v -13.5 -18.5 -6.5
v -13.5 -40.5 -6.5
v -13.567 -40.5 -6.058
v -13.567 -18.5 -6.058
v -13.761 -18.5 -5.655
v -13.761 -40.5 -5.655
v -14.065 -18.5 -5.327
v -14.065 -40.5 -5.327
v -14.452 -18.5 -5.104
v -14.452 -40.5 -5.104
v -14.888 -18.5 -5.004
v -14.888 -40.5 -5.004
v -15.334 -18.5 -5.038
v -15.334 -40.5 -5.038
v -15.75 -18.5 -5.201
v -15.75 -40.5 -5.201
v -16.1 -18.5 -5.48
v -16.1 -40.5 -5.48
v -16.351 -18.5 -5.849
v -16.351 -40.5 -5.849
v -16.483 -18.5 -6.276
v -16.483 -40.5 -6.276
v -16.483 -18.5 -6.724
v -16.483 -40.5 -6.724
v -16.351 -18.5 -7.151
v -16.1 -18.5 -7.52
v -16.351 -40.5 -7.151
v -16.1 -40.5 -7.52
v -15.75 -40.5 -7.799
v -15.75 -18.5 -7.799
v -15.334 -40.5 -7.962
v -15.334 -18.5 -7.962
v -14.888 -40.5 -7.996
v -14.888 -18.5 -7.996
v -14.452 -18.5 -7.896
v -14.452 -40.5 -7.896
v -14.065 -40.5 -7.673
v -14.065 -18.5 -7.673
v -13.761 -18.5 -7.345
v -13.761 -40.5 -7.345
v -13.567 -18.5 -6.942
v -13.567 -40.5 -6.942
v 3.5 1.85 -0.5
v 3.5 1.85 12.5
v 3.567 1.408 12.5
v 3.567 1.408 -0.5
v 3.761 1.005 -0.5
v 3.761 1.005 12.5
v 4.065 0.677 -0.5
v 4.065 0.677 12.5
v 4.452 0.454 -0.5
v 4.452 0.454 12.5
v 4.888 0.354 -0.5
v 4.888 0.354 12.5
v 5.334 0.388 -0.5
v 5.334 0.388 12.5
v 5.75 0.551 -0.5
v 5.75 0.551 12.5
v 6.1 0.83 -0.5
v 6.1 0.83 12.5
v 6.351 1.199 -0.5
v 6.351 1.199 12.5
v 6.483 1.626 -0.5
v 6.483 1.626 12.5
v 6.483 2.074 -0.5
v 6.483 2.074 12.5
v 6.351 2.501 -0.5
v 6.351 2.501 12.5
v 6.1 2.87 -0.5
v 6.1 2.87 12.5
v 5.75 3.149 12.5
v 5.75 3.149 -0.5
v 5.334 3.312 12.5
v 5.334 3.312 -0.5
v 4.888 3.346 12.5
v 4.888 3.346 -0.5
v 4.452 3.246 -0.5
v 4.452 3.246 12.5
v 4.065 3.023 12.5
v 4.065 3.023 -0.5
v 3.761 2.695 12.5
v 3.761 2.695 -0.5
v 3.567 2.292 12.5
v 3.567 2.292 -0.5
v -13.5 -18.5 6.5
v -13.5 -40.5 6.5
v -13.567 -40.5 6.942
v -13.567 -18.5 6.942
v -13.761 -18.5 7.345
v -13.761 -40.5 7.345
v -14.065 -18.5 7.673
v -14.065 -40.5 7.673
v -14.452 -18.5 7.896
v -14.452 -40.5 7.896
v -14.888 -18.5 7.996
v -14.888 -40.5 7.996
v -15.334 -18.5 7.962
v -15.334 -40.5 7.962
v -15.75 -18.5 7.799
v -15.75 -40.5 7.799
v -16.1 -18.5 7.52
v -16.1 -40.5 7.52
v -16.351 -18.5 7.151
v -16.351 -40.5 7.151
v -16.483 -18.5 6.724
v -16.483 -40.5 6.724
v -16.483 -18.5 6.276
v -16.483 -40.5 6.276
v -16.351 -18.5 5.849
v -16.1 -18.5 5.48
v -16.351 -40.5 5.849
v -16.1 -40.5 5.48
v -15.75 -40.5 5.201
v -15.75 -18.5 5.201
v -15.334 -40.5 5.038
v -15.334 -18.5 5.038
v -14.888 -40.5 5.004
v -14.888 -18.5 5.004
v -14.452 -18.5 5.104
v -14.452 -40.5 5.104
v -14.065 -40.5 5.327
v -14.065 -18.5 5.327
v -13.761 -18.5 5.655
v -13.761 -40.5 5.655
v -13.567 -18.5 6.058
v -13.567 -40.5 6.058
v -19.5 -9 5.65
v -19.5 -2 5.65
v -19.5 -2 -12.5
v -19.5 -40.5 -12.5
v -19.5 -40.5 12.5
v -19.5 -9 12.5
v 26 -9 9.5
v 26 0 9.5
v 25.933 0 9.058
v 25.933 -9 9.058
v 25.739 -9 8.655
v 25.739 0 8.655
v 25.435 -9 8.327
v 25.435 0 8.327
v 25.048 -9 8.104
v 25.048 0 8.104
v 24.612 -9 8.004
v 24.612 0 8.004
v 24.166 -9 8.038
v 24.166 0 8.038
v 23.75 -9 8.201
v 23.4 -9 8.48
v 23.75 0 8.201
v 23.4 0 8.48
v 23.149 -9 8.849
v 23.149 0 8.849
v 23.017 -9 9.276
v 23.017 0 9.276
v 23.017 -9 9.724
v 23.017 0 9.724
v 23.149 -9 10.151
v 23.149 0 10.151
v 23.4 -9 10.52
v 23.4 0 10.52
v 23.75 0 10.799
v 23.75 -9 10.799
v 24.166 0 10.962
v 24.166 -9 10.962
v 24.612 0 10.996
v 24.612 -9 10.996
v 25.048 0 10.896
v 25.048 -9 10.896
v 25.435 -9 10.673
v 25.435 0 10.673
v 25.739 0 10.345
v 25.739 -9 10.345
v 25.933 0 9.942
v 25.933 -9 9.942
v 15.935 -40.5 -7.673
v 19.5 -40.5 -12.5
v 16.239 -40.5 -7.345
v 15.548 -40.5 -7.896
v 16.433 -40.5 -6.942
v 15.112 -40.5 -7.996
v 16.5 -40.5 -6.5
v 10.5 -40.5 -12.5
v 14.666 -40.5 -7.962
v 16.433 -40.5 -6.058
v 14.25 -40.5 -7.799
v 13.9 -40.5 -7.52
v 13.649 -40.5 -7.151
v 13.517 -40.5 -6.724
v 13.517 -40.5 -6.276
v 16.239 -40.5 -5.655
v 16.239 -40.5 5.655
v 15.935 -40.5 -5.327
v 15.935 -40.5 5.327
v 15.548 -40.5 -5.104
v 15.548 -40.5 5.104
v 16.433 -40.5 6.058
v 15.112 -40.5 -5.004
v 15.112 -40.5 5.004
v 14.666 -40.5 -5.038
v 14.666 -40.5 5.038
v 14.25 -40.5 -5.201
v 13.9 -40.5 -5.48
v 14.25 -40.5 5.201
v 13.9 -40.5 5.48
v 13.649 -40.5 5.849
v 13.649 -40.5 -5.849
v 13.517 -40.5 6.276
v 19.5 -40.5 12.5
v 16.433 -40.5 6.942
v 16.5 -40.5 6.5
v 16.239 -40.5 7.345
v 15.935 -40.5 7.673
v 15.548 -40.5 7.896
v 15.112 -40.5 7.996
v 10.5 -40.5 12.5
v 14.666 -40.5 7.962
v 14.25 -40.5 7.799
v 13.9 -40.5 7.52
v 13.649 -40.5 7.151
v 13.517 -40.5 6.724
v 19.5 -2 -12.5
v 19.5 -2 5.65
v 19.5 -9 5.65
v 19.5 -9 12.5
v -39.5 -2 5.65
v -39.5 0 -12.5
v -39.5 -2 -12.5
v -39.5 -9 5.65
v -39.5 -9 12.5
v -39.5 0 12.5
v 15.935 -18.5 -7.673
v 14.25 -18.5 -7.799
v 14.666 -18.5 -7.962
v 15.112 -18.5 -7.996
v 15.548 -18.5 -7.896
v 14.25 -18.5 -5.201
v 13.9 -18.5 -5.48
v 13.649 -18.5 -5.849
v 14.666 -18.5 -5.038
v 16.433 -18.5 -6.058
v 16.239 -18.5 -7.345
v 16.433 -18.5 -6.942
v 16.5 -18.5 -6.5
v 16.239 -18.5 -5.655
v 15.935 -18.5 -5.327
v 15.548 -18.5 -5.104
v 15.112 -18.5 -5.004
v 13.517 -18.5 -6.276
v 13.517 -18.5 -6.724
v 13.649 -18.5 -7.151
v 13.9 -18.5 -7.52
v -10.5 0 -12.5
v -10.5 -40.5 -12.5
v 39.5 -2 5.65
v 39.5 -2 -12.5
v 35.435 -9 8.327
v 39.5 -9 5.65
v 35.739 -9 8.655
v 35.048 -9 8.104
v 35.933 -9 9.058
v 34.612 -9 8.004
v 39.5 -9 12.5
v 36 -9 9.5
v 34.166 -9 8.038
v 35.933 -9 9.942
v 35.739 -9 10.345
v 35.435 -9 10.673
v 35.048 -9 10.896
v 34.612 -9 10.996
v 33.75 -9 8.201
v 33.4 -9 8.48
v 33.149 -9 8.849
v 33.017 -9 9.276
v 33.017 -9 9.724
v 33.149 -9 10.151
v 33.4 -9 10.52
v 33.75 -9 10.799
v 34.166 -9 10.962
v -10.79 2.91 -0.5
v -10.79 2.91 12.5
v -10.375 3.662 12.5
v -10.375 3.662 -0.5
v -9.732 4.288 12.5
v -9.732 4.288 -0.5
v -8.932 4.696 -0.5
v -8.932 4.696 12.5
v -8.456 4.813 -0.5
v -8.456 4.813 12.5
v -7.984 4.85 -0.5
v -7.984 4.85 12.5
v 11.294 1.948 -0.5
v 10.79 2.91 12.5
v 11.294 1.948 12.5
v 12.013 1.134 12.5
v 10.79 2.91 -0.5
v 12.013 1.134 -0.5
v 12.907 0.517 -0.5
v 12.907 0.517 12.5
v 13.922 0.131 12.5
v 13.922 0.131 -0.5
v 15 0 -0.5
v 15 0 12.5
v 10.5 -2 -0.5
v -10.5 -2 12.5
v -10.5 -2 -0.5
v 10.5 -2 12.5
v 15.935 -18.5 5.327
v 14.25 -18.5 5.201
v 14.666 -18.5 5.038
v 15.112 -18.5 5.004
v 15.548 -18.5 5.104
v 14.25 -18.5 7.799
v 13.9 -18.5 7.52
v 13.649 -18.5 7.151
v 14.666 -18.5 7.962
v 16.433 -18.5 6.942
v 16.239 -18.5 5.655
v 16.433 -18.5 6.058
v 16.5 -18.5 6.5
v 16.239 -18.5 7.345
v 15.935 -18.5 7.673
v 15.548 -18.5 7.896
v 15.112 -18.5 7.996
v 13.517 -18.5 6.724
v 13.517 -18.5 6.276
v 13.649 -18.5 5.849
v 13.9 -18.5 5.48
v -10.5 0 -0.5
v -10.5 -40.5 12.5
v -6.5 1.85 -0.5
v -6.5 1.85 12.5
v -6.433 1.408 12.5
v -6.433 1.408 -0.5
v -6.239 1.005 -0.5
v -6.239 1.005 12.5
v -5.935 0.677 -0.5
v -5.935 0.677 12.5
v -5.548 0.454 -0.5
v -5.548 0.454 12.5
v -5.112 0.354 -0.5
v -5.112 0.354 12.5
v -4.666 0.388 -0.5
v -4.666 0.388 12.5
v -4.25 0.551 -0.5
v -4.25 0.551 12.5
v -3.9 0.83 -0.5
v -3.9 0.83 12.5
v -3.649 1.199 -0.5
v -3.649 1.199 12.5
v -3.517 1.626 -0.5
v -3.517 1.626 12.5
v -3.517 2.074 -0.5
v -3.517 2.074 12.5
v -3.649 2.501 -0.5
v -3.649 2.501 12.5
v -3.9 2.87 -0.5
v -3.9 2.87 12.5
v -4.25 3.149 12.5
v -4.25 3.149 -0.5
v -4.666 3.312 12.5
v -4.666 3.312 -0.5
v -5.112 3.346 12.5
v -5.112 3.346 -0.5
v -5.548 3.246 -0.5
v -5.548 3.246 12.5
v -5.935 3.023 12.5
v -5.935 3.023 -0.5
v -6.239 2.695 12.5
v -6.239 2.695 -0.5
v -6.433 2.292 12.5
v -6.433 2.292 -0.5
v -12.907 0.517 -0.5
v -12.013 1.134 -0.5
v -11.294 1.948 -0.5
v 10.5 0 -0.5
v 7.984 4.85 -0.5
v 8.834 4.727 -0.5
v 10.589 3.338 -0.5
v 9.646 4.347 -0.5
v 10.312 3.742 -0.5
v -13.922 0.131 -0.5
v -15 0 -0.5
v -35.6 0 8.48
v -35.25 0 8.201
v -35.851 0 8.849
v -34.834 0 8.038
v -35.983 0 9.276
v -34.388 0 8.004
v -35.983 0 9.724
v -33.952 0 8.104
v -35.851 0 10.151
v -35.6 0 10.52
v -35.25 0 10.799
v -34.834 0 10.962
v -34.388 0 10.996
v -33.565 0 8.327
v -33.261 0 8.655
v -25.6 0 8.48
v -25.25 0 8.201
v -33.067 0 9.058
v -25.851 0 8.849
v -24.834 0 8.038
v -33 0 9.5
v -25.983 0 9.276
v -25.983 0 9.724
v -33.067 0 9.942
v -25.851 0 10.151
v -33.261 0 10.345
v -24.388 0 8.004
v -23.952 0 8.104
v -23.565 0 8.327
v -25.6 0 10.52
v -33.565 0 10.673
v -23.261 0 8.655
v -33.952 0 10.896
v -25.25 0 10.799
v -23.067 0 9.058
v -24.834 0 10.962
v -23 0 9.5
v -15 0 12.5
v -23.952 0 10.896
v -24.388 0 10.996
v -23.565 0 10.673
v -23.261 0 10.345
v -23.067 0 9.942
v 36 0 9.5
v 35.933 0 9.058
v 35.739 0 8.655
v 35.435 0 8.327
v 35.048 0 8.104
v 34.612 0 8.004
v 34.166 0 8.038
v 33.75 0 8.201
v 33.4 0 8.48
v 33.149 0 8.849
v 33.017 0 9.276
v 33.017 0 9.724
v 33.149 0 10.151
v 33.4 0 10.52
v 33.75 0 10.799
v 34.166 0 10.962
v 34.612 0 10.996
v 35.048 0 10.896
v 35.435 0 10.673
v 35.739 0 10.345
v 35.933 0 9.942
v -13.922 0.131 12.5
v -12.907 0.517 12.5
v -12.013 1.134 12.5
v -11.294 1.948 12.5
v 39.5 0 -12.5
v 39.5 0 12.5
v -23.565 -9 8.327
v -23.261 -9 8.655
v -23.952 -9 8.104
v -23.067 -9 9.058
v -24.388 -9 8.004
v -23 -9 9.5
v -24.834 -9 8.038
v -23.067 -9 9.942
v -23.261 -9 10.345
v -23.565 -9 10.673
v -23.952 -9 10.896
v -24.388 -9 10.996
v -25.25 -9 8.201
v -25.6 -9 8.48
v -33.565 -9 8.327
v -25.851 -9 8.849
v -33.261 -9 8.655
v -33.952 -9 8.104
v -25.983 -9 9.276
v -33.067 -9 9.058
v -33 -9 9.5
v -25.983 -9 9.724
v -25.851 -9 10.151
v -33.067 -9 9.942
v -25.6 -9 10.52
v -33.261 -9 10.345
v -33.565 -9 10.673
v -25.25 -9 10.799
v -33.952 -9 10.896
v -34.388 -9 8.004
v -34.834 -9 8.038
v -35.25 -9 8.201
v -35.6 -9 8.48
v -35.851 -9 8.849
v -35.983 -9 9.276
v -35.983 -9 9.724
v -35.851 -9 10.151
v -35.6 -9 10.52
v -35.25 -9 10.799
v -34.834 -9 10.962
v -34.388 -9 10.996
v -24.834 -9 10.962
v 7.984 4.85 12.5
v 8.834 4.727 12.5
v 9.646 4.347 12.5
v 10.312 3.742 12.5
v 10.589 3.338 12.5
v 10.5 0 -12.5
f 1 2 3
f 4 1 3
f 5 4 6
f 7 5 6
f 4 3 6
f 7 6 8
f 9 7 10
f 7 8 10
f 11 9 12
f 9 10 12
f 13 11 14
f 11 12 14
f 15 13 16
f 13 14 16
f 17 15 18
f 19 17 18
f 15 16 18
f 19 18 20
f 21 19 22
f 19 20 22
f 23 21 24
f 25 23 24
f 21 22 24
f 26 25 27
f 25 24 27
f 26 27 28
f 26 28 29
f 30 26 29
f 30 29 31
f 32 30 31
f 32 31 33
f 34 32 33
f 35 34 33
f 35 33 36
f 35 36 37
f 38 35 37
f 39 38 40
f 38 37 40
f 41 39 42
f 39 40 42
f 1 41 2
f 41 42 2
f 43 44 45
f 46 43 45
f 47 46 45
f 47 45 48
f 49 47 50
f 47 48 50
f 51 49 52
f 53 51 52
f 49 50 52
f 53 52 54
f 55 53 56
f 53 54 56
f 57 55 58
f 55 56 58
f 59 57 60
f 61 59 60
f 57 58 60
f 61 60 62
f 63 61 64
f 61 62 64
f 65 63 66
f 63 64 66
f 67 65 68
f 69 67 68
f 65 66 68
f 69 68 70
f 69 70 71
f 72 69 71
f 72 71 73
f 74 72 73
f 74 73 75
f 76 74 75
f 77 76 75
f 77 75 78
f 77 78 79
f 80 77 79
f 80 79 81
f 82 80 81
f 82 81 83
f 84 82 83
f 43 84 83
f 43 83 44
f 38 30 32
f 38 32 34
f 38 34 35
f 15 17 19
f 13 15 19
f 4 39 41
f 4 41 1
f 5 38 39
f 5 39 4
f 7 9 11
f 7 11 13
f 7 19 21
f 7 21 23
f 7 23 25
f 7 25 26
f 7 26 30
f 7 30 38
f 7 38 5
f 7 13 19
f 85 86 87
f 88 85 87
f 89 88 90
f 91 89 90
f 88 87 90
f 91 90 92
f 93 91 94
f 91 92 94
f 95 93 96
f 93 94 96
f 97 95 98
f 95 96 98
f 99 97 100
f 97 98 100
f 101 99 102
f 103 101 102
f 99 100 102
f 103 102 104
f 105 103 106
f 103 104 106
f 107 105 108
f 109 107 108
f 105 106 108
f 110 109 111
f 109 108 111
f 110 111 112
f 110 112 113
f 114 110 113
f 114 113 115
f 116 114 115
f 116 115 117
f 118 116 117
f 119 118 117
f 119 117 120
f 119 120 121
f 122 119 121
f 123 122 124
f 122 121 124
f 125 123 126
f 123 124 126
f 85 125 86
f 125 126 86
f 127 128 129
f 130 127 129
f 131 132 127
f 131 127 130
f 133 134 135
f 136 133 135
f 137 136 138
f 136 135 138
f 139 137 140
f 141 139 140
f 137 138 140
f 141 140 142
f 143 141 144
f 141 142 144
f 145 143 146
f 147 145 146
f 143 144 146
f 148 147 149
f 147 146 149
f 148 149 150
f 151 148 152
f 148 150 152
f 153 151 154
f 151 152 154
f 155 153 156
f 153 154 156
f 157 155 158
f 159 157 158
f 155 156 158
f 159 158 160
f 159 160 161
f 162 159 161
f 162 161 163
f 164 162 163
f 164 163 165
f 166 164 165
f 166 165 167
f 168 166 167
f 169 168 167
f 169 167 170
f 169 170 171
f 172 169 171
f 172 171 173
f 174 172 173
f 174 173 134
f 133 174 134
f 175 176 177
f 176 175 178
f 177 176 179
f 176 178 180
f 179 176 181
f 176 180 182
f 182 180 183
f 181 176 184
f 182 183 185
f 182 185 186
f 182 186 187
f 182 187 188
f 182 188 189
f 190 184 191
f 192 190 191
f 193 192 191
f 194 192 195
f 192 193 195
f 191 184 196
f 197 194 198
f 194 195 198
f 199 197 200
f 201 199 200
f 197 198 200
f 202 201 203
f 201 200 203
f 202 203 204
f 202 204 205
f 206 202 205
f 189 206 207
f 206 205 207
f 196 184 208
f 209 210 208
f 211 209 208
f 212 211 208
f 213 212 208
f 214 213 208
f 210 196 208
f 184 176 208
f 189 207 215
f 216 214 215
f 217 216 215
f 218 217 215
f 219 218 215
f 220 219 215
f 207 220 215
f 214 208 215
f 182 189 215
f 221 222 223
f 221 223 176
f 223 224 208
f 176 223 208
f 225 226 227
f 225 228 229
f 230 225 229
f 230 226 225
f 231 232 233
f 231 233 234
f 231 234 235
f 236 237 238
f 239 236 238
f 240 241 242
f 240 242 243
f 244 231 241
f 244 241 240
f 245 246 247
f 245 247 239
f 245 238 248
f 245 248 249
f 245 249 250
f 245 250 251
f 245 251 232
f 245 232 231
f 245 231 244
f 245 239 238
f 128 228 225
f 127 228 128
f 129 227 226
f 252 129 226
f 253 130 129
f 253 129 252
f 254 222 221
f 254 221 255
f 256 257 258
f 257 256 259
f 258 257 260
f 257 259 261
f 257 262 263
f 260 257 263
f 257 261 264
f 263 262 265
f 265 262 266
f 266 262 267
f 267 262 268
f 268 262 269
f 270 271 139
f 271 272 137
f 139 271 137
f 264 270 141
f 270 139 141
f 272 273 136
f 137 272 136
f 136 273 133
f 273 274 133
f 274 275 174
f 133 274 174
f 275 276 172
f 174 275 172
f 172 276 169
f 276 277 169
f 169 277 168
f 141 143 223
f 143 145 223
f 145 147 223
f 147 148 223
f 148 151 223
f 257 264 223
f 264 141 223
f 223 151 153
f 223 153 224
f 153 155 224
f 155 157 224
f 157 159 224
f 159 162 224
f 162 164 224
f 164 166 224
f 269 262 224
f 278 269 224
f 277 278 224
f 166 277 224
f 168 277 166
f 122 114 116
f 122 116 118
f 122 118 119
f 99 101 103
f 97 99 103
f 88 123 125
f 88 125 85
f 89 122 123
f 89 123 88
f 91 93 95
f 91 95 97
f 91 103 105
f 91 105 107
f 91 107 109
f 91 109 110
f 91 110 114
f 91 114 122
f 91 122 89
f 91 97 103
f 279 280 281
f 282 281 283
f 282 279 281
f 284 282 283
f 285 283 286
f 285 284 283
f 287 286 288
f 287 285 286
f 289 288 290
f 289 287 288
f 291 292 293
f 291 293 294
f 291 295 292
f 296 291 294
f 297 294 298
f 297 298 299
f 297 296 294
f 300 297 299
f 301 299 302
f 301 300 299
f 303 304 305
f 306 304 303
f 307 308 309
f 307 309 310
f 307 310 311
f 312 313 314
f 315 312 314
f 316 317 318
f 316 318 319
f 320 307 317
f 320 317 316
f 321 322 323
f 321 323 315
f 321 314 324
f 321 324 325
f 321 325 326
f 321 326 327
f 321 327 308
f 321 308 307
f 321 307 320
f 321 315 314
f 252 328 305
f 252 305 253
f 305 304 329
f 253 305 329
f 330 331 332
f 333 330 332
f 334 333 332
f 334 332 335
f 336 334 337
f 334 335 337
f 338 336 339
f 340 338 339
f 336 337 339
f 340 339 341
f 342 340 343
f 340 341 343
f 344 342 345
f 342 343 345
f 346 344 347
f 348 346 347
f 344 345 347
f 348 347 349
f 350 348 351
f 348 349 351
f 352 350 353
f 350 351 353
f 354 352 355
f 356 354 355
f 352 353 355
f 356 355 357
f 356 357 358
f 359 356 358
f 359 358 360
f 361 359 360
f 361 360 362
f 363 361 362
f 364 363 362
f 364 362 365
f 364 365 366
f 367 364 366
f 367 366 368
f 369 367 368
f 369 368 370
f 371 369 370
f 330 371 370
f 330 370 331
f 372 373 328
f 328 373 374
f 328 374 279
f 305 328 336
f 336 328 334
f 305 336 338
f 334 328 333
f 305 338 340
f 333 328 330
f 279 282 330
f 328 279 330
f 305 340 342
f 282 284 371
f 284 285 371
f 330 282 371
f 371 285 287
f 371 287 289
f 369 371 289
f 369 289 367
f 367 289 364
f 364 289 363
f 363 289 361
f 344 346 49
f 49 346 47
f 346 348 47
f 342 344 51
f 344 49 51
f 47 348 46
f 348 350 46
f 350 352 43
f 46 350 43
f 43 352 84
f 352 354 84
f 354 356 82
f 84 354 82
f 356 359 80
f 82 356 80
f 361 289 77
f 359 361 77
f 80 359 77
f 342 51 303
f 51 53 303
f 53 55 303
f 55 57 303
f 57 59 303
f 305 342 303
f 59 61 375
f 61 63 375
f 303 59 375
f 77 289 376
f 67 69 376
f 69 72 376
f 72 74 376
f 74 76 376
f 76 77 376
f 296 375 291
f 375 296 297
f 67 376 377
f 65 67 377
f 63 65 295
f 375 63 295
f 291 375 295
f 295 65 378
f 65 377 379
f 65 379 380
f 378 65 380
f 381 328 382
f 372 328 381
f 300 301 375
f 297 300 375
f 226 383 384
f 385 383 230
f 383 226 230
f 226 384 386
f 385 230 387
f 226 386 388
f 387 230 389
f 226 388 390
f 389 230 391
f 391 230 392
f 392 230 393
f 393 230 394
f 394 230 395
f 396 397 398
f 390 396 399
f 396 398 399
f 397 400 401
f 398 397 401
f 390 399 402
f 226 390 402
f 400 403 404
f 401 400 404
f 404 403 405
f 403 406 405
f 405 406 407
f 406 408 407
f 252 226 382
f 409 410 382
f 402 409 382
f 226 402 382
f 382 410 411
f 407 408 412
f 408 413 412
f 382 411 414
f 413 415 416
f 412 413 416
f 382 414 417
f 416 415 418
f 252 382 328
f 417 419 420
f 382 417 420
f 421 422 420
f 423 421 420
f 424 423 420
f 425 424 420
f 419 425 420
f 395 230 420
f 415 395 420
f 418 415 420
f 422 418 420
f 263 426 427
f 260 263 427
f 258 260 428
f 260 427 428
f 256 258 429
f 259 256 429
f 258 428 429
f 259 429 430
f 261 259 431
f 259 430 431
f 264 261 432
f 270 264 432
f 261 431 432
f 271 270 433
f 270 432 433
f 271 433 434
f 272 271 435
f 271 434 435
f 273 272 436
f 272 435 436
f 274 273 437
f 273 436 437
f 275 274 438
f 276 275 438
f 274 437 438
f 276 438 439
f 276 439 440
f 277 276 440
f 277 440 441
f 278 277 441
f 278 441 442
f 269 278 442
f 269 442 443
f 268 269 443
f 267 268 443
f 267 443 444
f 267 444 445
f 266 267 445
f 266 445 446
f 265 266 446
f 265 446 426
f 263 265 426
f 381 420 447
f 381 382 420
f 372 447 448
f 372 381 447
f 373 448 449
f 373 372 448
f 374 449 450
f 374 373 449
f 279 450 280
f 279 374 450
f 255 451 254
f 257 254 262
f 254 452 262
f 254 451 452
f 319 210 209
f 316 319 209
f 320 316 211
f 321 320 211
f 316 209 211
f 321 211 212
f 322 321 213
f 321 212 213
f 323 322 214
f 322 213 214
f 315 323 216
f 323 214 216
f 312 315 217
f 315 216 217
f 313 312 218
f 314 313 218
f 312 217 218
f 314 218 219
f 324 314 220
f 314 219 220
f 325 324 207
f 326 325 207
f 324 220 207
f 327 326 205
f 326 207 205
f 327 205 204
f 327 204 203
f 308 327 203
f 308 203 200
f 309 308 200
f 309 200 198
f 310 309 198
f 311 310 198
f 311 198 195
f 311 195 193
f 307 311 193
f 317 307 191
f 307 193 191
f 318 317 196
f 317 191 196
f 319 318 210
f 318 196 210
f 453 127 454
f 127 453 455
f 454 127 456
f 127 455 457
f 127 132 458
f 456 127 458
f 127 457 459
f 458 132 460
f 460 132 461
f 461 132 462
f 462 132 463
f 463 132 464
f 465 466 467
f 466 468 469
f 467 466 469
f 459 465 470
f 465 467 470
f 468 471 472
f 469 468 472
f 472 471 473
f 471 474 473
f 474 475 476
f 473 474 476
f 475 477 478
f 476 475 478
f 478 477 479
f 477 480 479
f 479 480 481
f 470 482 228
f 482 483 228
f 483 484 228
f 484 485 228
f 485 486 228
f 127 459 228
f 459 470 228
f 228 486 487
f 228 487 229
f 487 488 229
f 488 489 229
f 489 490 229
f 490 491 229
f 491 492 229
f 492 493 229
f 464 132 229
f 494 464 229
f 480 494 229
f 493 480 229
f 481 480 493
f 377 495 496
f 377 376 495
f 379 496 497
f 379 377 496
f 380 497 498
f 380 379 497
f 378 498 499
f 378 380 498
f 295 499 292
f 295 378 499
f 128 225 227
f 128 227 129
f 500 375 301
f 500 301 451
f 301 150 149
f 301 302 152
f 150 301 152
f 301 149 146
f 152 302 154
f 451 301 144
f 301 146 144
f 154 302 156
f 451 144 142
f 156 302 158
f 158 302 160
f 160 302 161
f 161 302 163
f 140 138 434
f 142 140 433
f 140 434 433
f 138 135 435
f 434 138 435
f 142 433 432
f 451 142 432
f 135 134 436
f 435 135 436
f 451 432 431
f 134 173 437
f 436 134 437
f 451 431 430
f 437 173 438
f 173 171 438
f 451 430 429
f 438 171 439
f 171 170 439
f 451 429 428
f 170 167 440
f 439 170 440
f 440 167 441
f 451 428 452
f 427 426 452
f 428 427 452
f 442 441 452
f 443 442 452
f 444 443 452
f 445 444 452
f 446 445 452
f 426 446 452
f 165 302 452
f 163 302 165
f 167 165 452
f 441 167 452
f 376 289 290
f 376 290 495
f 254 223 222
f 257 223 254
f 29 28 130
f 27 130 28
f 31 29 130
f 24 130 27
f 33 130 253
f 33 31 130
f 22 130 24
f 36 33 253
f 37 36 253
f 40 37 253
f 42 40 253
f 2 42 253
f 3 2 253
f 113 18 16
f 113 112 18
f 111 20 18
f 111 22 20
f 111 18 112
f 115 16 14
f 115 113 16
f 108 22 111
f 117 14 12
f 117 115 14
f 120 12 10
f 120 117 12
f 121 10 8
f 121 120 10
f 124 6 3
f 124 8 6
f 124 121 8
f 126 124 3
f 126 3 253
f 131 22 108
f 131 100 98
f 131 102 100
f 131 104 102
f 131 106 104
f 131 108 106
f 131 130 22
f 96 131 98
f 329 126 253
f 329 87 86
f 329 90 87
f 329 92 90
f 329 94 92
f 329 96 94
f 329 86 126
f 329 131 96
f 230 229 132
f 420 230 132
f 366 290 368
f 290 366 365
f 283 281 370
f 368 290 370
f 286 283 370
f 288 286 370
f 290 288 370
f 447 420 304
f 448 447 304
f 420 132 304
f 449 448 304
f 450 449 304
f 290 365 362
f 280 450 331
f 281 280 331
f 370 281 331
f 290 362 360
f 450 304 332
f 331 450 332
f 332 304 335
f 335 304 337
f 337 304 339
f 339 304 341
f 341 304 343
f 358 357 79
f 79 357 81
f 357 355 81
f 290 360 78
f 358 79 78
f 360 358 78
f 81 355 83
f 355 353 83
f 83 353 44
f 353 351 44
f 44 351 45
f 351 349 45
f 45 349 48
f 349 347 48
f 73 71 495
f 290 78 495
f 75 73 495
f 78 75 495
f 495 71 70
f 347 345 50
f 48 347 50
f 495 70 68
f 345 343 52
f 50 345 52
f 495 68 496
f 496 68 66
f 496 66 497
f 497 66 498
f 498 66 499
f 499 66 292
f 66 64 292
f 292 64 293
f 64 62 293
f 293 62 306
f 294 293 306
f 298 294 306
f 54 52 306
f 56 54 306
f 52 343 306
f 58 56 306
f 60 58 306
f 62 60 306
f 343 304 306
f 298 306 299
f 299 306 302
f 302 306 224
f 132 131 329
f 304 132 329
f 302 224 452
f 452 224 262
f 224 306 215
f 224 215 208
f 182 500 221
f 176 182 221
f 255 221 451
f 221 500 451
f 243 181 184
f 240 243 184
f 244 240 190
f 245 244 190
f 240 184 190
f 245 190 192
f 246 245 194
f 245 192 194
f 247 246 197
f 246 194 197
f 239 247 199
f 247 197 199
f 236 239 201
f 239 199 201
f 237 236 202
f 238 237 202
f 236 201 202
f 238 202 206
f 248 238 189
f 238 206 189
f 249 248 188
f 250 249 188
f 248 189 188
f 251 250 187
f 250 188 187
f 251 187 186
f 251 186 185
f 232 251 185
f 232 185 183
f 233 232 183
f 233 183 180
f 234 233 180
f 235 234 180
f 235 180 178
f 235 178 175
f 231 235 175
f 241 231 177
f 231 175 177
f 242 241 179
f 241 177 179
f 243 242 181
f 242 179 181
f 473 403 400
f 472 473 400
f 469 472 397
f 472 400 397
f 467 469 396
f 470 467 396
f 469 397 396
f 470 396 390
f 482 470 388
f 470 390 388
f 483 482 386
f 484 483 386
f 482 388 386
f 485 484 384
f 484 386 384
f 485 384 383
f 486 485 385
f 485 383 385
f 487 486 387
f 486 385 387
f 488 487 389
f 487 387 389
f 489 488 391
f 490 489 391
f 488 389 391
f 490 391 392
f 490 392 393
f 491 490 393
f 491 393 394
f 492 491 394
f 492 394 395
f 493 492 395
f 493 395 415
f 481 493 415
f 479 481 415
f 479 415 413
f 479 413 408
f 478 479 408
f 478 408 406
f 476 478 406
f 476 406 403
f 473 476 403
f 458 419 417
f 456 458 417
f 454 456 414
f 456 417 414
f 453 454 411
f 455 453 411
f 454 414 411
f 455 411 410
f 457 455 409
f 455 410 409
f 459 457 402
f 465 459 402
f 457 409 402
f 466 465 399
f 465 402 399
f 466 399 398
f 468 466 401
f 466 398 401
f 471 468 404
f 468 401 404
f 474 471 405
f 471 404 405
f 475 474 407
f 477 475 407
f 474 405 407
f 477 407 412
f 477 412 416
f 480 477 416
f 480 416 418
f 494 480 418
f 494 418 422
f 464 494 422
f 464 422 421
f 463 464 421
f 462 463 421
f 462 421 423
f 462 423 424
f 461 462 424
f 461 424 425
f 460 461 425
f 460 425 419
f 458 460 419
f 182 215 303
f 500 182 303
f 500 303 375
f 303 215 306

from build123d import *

# Parameters (mm, degrees)
SKETCH_W        = 79
SKETCH_H        = 25
PAD_DEPTH       = 2
SKETCH001_W     = 21
SKETCH001_H     = 25
PAD001_DEPTH    = 4.85
SKETCH002_R     = 1.5
POCKET_DEPTH    = 25.001
SKETCH003_W     = 21
SKETCH003_H     = 12
POCKET001_DEPTH = 10
PAD002_DEPTH    = 6.85
SKETCH005_W     = 9
SKETCH005_H     = 38.5
PAD003_DEPTH    = 18.15
SKETCH006_R     = 1.5
POCKET002_DEPTH = 10
SKETCH007_R     = 1.5
POCKET003_DEPTH = 22
FILLET_R        = 4.5
FILLET001_R     = 3


with BuildPart() as part:
    # Sketch → Pad (new body)
    with BuildSketch(Plane.XZ):
        Rectangle(SKETCH_W, SKETCH_H)
    extrude(amount=PAD_DEPTH)

    # Sketch001 (on Face5 of Pad) → Pad001 (join)
    with BuildSketch(Plane(origin=(0, 0, 0), x_dir=(1, 0, 0), z_dir=(0, 1, 0))):
        Rectangle(SKETCH001_W, SKETCH001_H)
    extrude(amount=PAD001_DEPTH)

    # Sketch002 (on Face5 of Pad001) → Pocket (cut, through all)
    with BuildSketch(Plane(origin=(0, 0, 12.5), x_dir=(-1, 0, 0), z_dir=(0, 0, 1))):
        with Locations((-5, -1.85)):
            Circle(SKETCH002_R)
        with Locations((5, -1.85)):
            Circle(SKETCH002_R)
    extrude(amount=-POCKET_DEPTH, mode=Mode.SUBTRACT)

    # Sketch003 (on Face11 of Pocket) → Pocket001 (cut)
    with BuildSketch(Plane(origin=(0, 4.85, 0), x_dir=(1, 0, 0), z_dir=(0, 1, 0))):
        with Locations((0, 6.5)):
            Rectangle(SKETCH003_W, SKETCH003_H)
    extrude(amount=-POCKET001_DEPTH, mode=Mode.SUBTRACT)

    # Sketch004 (on DatumPlane) → Pad002 (join)
    with BuildSketch(Plane(origin=(0, -2, 12.5), x_dir=(1, 0, 0), z_dir=(0, 0, -1))):
        Polygon((39.5, 0), (39.5, 7), (19.5, 7), (19.5, 38.5), (10.5, 38.5), (10.5, 0), align=None)
        Polygon((-19.5, 38.5), (-19.5, 7), (-39.5, 7), (-39.5, 0), (-10.5, 0), (-10.5, 38.5), align=None)
    extrude(amount=PAD002_DEPTH)

    # Sketch005 (on Face26 of Pad002) → Pad003 (join)
    with BuildSketch(Plane(origin=(0, 0, 5.65), x_dir=(1, 0, 0), z_dir=(0, 0, -1))):
        with Locations((-15, 21.25)):
            Rectangle(SKETCH005_W, SKETCH005_H)
        with Locations((15, 21.25)):
            Rectangle(SKETCH005_W, SKETCH005_H)
    extrude(amount=PAD003_DEPTH)

    # Sketch006 (on Face4 of Pad003) → Pocket002 (cut)
    with BuildSketch(Plane(origin=(0, 0, 0), x_dir=(1, 0, 0), z_dir=(0, 1, 0))):
        with Locations((24.5, -9.5)):
            Circle(SKETCH006_R)
        with Locations((34.5, -9.5)):
            Circle(SKETCH006_R)
        with Locations((-34.5, -9.5)):
            Circle(SKETCH006_R)
        with Locations((-24.5, -9.5)):
            Circle(SKETCH006_R)
    extrude(amount=-POCKET002_DEPTH, mode=Mode.SUBTRACT)

    # Sketch007 (on Face44 of Pocket002) → Pocket003 (cut)
    with BuildSketch(Plane.XZ.offset(40.5)):
        with Locations((15, -6.5)):
            Circle(SKETCH007_R)
        with Locations((15, 6.5)):
            Circle(SKETCH007_R)
        with Locations((-15, -6.5)):
            Circle(SKETCH007_R)
        with Locations((-15, 6.5)):
            Circle(SKETCH007_R)
    extrude(amount=-POCKET003_DEPTH, mode=Mode.SUBTRACT)

    # Fillet
    fillet_edges = [part.edges().sort_by_distance(p)[0] for p in [
        (-10.5, 0, 6),
        (10.5, 0, 6),
    ]]
    fillet(fillet_edges, radius=FILLET_R)

    # Fillet001
    fillet001_edges = [part.edges().sort_by_distance(p)[0] for p in [
        (10.5, 4.85, 6),
        (-10.5, 4.85, 6),
    ]]
    fillet(fillet001_edges, radius=FILLET001_R)


solid = part.part
